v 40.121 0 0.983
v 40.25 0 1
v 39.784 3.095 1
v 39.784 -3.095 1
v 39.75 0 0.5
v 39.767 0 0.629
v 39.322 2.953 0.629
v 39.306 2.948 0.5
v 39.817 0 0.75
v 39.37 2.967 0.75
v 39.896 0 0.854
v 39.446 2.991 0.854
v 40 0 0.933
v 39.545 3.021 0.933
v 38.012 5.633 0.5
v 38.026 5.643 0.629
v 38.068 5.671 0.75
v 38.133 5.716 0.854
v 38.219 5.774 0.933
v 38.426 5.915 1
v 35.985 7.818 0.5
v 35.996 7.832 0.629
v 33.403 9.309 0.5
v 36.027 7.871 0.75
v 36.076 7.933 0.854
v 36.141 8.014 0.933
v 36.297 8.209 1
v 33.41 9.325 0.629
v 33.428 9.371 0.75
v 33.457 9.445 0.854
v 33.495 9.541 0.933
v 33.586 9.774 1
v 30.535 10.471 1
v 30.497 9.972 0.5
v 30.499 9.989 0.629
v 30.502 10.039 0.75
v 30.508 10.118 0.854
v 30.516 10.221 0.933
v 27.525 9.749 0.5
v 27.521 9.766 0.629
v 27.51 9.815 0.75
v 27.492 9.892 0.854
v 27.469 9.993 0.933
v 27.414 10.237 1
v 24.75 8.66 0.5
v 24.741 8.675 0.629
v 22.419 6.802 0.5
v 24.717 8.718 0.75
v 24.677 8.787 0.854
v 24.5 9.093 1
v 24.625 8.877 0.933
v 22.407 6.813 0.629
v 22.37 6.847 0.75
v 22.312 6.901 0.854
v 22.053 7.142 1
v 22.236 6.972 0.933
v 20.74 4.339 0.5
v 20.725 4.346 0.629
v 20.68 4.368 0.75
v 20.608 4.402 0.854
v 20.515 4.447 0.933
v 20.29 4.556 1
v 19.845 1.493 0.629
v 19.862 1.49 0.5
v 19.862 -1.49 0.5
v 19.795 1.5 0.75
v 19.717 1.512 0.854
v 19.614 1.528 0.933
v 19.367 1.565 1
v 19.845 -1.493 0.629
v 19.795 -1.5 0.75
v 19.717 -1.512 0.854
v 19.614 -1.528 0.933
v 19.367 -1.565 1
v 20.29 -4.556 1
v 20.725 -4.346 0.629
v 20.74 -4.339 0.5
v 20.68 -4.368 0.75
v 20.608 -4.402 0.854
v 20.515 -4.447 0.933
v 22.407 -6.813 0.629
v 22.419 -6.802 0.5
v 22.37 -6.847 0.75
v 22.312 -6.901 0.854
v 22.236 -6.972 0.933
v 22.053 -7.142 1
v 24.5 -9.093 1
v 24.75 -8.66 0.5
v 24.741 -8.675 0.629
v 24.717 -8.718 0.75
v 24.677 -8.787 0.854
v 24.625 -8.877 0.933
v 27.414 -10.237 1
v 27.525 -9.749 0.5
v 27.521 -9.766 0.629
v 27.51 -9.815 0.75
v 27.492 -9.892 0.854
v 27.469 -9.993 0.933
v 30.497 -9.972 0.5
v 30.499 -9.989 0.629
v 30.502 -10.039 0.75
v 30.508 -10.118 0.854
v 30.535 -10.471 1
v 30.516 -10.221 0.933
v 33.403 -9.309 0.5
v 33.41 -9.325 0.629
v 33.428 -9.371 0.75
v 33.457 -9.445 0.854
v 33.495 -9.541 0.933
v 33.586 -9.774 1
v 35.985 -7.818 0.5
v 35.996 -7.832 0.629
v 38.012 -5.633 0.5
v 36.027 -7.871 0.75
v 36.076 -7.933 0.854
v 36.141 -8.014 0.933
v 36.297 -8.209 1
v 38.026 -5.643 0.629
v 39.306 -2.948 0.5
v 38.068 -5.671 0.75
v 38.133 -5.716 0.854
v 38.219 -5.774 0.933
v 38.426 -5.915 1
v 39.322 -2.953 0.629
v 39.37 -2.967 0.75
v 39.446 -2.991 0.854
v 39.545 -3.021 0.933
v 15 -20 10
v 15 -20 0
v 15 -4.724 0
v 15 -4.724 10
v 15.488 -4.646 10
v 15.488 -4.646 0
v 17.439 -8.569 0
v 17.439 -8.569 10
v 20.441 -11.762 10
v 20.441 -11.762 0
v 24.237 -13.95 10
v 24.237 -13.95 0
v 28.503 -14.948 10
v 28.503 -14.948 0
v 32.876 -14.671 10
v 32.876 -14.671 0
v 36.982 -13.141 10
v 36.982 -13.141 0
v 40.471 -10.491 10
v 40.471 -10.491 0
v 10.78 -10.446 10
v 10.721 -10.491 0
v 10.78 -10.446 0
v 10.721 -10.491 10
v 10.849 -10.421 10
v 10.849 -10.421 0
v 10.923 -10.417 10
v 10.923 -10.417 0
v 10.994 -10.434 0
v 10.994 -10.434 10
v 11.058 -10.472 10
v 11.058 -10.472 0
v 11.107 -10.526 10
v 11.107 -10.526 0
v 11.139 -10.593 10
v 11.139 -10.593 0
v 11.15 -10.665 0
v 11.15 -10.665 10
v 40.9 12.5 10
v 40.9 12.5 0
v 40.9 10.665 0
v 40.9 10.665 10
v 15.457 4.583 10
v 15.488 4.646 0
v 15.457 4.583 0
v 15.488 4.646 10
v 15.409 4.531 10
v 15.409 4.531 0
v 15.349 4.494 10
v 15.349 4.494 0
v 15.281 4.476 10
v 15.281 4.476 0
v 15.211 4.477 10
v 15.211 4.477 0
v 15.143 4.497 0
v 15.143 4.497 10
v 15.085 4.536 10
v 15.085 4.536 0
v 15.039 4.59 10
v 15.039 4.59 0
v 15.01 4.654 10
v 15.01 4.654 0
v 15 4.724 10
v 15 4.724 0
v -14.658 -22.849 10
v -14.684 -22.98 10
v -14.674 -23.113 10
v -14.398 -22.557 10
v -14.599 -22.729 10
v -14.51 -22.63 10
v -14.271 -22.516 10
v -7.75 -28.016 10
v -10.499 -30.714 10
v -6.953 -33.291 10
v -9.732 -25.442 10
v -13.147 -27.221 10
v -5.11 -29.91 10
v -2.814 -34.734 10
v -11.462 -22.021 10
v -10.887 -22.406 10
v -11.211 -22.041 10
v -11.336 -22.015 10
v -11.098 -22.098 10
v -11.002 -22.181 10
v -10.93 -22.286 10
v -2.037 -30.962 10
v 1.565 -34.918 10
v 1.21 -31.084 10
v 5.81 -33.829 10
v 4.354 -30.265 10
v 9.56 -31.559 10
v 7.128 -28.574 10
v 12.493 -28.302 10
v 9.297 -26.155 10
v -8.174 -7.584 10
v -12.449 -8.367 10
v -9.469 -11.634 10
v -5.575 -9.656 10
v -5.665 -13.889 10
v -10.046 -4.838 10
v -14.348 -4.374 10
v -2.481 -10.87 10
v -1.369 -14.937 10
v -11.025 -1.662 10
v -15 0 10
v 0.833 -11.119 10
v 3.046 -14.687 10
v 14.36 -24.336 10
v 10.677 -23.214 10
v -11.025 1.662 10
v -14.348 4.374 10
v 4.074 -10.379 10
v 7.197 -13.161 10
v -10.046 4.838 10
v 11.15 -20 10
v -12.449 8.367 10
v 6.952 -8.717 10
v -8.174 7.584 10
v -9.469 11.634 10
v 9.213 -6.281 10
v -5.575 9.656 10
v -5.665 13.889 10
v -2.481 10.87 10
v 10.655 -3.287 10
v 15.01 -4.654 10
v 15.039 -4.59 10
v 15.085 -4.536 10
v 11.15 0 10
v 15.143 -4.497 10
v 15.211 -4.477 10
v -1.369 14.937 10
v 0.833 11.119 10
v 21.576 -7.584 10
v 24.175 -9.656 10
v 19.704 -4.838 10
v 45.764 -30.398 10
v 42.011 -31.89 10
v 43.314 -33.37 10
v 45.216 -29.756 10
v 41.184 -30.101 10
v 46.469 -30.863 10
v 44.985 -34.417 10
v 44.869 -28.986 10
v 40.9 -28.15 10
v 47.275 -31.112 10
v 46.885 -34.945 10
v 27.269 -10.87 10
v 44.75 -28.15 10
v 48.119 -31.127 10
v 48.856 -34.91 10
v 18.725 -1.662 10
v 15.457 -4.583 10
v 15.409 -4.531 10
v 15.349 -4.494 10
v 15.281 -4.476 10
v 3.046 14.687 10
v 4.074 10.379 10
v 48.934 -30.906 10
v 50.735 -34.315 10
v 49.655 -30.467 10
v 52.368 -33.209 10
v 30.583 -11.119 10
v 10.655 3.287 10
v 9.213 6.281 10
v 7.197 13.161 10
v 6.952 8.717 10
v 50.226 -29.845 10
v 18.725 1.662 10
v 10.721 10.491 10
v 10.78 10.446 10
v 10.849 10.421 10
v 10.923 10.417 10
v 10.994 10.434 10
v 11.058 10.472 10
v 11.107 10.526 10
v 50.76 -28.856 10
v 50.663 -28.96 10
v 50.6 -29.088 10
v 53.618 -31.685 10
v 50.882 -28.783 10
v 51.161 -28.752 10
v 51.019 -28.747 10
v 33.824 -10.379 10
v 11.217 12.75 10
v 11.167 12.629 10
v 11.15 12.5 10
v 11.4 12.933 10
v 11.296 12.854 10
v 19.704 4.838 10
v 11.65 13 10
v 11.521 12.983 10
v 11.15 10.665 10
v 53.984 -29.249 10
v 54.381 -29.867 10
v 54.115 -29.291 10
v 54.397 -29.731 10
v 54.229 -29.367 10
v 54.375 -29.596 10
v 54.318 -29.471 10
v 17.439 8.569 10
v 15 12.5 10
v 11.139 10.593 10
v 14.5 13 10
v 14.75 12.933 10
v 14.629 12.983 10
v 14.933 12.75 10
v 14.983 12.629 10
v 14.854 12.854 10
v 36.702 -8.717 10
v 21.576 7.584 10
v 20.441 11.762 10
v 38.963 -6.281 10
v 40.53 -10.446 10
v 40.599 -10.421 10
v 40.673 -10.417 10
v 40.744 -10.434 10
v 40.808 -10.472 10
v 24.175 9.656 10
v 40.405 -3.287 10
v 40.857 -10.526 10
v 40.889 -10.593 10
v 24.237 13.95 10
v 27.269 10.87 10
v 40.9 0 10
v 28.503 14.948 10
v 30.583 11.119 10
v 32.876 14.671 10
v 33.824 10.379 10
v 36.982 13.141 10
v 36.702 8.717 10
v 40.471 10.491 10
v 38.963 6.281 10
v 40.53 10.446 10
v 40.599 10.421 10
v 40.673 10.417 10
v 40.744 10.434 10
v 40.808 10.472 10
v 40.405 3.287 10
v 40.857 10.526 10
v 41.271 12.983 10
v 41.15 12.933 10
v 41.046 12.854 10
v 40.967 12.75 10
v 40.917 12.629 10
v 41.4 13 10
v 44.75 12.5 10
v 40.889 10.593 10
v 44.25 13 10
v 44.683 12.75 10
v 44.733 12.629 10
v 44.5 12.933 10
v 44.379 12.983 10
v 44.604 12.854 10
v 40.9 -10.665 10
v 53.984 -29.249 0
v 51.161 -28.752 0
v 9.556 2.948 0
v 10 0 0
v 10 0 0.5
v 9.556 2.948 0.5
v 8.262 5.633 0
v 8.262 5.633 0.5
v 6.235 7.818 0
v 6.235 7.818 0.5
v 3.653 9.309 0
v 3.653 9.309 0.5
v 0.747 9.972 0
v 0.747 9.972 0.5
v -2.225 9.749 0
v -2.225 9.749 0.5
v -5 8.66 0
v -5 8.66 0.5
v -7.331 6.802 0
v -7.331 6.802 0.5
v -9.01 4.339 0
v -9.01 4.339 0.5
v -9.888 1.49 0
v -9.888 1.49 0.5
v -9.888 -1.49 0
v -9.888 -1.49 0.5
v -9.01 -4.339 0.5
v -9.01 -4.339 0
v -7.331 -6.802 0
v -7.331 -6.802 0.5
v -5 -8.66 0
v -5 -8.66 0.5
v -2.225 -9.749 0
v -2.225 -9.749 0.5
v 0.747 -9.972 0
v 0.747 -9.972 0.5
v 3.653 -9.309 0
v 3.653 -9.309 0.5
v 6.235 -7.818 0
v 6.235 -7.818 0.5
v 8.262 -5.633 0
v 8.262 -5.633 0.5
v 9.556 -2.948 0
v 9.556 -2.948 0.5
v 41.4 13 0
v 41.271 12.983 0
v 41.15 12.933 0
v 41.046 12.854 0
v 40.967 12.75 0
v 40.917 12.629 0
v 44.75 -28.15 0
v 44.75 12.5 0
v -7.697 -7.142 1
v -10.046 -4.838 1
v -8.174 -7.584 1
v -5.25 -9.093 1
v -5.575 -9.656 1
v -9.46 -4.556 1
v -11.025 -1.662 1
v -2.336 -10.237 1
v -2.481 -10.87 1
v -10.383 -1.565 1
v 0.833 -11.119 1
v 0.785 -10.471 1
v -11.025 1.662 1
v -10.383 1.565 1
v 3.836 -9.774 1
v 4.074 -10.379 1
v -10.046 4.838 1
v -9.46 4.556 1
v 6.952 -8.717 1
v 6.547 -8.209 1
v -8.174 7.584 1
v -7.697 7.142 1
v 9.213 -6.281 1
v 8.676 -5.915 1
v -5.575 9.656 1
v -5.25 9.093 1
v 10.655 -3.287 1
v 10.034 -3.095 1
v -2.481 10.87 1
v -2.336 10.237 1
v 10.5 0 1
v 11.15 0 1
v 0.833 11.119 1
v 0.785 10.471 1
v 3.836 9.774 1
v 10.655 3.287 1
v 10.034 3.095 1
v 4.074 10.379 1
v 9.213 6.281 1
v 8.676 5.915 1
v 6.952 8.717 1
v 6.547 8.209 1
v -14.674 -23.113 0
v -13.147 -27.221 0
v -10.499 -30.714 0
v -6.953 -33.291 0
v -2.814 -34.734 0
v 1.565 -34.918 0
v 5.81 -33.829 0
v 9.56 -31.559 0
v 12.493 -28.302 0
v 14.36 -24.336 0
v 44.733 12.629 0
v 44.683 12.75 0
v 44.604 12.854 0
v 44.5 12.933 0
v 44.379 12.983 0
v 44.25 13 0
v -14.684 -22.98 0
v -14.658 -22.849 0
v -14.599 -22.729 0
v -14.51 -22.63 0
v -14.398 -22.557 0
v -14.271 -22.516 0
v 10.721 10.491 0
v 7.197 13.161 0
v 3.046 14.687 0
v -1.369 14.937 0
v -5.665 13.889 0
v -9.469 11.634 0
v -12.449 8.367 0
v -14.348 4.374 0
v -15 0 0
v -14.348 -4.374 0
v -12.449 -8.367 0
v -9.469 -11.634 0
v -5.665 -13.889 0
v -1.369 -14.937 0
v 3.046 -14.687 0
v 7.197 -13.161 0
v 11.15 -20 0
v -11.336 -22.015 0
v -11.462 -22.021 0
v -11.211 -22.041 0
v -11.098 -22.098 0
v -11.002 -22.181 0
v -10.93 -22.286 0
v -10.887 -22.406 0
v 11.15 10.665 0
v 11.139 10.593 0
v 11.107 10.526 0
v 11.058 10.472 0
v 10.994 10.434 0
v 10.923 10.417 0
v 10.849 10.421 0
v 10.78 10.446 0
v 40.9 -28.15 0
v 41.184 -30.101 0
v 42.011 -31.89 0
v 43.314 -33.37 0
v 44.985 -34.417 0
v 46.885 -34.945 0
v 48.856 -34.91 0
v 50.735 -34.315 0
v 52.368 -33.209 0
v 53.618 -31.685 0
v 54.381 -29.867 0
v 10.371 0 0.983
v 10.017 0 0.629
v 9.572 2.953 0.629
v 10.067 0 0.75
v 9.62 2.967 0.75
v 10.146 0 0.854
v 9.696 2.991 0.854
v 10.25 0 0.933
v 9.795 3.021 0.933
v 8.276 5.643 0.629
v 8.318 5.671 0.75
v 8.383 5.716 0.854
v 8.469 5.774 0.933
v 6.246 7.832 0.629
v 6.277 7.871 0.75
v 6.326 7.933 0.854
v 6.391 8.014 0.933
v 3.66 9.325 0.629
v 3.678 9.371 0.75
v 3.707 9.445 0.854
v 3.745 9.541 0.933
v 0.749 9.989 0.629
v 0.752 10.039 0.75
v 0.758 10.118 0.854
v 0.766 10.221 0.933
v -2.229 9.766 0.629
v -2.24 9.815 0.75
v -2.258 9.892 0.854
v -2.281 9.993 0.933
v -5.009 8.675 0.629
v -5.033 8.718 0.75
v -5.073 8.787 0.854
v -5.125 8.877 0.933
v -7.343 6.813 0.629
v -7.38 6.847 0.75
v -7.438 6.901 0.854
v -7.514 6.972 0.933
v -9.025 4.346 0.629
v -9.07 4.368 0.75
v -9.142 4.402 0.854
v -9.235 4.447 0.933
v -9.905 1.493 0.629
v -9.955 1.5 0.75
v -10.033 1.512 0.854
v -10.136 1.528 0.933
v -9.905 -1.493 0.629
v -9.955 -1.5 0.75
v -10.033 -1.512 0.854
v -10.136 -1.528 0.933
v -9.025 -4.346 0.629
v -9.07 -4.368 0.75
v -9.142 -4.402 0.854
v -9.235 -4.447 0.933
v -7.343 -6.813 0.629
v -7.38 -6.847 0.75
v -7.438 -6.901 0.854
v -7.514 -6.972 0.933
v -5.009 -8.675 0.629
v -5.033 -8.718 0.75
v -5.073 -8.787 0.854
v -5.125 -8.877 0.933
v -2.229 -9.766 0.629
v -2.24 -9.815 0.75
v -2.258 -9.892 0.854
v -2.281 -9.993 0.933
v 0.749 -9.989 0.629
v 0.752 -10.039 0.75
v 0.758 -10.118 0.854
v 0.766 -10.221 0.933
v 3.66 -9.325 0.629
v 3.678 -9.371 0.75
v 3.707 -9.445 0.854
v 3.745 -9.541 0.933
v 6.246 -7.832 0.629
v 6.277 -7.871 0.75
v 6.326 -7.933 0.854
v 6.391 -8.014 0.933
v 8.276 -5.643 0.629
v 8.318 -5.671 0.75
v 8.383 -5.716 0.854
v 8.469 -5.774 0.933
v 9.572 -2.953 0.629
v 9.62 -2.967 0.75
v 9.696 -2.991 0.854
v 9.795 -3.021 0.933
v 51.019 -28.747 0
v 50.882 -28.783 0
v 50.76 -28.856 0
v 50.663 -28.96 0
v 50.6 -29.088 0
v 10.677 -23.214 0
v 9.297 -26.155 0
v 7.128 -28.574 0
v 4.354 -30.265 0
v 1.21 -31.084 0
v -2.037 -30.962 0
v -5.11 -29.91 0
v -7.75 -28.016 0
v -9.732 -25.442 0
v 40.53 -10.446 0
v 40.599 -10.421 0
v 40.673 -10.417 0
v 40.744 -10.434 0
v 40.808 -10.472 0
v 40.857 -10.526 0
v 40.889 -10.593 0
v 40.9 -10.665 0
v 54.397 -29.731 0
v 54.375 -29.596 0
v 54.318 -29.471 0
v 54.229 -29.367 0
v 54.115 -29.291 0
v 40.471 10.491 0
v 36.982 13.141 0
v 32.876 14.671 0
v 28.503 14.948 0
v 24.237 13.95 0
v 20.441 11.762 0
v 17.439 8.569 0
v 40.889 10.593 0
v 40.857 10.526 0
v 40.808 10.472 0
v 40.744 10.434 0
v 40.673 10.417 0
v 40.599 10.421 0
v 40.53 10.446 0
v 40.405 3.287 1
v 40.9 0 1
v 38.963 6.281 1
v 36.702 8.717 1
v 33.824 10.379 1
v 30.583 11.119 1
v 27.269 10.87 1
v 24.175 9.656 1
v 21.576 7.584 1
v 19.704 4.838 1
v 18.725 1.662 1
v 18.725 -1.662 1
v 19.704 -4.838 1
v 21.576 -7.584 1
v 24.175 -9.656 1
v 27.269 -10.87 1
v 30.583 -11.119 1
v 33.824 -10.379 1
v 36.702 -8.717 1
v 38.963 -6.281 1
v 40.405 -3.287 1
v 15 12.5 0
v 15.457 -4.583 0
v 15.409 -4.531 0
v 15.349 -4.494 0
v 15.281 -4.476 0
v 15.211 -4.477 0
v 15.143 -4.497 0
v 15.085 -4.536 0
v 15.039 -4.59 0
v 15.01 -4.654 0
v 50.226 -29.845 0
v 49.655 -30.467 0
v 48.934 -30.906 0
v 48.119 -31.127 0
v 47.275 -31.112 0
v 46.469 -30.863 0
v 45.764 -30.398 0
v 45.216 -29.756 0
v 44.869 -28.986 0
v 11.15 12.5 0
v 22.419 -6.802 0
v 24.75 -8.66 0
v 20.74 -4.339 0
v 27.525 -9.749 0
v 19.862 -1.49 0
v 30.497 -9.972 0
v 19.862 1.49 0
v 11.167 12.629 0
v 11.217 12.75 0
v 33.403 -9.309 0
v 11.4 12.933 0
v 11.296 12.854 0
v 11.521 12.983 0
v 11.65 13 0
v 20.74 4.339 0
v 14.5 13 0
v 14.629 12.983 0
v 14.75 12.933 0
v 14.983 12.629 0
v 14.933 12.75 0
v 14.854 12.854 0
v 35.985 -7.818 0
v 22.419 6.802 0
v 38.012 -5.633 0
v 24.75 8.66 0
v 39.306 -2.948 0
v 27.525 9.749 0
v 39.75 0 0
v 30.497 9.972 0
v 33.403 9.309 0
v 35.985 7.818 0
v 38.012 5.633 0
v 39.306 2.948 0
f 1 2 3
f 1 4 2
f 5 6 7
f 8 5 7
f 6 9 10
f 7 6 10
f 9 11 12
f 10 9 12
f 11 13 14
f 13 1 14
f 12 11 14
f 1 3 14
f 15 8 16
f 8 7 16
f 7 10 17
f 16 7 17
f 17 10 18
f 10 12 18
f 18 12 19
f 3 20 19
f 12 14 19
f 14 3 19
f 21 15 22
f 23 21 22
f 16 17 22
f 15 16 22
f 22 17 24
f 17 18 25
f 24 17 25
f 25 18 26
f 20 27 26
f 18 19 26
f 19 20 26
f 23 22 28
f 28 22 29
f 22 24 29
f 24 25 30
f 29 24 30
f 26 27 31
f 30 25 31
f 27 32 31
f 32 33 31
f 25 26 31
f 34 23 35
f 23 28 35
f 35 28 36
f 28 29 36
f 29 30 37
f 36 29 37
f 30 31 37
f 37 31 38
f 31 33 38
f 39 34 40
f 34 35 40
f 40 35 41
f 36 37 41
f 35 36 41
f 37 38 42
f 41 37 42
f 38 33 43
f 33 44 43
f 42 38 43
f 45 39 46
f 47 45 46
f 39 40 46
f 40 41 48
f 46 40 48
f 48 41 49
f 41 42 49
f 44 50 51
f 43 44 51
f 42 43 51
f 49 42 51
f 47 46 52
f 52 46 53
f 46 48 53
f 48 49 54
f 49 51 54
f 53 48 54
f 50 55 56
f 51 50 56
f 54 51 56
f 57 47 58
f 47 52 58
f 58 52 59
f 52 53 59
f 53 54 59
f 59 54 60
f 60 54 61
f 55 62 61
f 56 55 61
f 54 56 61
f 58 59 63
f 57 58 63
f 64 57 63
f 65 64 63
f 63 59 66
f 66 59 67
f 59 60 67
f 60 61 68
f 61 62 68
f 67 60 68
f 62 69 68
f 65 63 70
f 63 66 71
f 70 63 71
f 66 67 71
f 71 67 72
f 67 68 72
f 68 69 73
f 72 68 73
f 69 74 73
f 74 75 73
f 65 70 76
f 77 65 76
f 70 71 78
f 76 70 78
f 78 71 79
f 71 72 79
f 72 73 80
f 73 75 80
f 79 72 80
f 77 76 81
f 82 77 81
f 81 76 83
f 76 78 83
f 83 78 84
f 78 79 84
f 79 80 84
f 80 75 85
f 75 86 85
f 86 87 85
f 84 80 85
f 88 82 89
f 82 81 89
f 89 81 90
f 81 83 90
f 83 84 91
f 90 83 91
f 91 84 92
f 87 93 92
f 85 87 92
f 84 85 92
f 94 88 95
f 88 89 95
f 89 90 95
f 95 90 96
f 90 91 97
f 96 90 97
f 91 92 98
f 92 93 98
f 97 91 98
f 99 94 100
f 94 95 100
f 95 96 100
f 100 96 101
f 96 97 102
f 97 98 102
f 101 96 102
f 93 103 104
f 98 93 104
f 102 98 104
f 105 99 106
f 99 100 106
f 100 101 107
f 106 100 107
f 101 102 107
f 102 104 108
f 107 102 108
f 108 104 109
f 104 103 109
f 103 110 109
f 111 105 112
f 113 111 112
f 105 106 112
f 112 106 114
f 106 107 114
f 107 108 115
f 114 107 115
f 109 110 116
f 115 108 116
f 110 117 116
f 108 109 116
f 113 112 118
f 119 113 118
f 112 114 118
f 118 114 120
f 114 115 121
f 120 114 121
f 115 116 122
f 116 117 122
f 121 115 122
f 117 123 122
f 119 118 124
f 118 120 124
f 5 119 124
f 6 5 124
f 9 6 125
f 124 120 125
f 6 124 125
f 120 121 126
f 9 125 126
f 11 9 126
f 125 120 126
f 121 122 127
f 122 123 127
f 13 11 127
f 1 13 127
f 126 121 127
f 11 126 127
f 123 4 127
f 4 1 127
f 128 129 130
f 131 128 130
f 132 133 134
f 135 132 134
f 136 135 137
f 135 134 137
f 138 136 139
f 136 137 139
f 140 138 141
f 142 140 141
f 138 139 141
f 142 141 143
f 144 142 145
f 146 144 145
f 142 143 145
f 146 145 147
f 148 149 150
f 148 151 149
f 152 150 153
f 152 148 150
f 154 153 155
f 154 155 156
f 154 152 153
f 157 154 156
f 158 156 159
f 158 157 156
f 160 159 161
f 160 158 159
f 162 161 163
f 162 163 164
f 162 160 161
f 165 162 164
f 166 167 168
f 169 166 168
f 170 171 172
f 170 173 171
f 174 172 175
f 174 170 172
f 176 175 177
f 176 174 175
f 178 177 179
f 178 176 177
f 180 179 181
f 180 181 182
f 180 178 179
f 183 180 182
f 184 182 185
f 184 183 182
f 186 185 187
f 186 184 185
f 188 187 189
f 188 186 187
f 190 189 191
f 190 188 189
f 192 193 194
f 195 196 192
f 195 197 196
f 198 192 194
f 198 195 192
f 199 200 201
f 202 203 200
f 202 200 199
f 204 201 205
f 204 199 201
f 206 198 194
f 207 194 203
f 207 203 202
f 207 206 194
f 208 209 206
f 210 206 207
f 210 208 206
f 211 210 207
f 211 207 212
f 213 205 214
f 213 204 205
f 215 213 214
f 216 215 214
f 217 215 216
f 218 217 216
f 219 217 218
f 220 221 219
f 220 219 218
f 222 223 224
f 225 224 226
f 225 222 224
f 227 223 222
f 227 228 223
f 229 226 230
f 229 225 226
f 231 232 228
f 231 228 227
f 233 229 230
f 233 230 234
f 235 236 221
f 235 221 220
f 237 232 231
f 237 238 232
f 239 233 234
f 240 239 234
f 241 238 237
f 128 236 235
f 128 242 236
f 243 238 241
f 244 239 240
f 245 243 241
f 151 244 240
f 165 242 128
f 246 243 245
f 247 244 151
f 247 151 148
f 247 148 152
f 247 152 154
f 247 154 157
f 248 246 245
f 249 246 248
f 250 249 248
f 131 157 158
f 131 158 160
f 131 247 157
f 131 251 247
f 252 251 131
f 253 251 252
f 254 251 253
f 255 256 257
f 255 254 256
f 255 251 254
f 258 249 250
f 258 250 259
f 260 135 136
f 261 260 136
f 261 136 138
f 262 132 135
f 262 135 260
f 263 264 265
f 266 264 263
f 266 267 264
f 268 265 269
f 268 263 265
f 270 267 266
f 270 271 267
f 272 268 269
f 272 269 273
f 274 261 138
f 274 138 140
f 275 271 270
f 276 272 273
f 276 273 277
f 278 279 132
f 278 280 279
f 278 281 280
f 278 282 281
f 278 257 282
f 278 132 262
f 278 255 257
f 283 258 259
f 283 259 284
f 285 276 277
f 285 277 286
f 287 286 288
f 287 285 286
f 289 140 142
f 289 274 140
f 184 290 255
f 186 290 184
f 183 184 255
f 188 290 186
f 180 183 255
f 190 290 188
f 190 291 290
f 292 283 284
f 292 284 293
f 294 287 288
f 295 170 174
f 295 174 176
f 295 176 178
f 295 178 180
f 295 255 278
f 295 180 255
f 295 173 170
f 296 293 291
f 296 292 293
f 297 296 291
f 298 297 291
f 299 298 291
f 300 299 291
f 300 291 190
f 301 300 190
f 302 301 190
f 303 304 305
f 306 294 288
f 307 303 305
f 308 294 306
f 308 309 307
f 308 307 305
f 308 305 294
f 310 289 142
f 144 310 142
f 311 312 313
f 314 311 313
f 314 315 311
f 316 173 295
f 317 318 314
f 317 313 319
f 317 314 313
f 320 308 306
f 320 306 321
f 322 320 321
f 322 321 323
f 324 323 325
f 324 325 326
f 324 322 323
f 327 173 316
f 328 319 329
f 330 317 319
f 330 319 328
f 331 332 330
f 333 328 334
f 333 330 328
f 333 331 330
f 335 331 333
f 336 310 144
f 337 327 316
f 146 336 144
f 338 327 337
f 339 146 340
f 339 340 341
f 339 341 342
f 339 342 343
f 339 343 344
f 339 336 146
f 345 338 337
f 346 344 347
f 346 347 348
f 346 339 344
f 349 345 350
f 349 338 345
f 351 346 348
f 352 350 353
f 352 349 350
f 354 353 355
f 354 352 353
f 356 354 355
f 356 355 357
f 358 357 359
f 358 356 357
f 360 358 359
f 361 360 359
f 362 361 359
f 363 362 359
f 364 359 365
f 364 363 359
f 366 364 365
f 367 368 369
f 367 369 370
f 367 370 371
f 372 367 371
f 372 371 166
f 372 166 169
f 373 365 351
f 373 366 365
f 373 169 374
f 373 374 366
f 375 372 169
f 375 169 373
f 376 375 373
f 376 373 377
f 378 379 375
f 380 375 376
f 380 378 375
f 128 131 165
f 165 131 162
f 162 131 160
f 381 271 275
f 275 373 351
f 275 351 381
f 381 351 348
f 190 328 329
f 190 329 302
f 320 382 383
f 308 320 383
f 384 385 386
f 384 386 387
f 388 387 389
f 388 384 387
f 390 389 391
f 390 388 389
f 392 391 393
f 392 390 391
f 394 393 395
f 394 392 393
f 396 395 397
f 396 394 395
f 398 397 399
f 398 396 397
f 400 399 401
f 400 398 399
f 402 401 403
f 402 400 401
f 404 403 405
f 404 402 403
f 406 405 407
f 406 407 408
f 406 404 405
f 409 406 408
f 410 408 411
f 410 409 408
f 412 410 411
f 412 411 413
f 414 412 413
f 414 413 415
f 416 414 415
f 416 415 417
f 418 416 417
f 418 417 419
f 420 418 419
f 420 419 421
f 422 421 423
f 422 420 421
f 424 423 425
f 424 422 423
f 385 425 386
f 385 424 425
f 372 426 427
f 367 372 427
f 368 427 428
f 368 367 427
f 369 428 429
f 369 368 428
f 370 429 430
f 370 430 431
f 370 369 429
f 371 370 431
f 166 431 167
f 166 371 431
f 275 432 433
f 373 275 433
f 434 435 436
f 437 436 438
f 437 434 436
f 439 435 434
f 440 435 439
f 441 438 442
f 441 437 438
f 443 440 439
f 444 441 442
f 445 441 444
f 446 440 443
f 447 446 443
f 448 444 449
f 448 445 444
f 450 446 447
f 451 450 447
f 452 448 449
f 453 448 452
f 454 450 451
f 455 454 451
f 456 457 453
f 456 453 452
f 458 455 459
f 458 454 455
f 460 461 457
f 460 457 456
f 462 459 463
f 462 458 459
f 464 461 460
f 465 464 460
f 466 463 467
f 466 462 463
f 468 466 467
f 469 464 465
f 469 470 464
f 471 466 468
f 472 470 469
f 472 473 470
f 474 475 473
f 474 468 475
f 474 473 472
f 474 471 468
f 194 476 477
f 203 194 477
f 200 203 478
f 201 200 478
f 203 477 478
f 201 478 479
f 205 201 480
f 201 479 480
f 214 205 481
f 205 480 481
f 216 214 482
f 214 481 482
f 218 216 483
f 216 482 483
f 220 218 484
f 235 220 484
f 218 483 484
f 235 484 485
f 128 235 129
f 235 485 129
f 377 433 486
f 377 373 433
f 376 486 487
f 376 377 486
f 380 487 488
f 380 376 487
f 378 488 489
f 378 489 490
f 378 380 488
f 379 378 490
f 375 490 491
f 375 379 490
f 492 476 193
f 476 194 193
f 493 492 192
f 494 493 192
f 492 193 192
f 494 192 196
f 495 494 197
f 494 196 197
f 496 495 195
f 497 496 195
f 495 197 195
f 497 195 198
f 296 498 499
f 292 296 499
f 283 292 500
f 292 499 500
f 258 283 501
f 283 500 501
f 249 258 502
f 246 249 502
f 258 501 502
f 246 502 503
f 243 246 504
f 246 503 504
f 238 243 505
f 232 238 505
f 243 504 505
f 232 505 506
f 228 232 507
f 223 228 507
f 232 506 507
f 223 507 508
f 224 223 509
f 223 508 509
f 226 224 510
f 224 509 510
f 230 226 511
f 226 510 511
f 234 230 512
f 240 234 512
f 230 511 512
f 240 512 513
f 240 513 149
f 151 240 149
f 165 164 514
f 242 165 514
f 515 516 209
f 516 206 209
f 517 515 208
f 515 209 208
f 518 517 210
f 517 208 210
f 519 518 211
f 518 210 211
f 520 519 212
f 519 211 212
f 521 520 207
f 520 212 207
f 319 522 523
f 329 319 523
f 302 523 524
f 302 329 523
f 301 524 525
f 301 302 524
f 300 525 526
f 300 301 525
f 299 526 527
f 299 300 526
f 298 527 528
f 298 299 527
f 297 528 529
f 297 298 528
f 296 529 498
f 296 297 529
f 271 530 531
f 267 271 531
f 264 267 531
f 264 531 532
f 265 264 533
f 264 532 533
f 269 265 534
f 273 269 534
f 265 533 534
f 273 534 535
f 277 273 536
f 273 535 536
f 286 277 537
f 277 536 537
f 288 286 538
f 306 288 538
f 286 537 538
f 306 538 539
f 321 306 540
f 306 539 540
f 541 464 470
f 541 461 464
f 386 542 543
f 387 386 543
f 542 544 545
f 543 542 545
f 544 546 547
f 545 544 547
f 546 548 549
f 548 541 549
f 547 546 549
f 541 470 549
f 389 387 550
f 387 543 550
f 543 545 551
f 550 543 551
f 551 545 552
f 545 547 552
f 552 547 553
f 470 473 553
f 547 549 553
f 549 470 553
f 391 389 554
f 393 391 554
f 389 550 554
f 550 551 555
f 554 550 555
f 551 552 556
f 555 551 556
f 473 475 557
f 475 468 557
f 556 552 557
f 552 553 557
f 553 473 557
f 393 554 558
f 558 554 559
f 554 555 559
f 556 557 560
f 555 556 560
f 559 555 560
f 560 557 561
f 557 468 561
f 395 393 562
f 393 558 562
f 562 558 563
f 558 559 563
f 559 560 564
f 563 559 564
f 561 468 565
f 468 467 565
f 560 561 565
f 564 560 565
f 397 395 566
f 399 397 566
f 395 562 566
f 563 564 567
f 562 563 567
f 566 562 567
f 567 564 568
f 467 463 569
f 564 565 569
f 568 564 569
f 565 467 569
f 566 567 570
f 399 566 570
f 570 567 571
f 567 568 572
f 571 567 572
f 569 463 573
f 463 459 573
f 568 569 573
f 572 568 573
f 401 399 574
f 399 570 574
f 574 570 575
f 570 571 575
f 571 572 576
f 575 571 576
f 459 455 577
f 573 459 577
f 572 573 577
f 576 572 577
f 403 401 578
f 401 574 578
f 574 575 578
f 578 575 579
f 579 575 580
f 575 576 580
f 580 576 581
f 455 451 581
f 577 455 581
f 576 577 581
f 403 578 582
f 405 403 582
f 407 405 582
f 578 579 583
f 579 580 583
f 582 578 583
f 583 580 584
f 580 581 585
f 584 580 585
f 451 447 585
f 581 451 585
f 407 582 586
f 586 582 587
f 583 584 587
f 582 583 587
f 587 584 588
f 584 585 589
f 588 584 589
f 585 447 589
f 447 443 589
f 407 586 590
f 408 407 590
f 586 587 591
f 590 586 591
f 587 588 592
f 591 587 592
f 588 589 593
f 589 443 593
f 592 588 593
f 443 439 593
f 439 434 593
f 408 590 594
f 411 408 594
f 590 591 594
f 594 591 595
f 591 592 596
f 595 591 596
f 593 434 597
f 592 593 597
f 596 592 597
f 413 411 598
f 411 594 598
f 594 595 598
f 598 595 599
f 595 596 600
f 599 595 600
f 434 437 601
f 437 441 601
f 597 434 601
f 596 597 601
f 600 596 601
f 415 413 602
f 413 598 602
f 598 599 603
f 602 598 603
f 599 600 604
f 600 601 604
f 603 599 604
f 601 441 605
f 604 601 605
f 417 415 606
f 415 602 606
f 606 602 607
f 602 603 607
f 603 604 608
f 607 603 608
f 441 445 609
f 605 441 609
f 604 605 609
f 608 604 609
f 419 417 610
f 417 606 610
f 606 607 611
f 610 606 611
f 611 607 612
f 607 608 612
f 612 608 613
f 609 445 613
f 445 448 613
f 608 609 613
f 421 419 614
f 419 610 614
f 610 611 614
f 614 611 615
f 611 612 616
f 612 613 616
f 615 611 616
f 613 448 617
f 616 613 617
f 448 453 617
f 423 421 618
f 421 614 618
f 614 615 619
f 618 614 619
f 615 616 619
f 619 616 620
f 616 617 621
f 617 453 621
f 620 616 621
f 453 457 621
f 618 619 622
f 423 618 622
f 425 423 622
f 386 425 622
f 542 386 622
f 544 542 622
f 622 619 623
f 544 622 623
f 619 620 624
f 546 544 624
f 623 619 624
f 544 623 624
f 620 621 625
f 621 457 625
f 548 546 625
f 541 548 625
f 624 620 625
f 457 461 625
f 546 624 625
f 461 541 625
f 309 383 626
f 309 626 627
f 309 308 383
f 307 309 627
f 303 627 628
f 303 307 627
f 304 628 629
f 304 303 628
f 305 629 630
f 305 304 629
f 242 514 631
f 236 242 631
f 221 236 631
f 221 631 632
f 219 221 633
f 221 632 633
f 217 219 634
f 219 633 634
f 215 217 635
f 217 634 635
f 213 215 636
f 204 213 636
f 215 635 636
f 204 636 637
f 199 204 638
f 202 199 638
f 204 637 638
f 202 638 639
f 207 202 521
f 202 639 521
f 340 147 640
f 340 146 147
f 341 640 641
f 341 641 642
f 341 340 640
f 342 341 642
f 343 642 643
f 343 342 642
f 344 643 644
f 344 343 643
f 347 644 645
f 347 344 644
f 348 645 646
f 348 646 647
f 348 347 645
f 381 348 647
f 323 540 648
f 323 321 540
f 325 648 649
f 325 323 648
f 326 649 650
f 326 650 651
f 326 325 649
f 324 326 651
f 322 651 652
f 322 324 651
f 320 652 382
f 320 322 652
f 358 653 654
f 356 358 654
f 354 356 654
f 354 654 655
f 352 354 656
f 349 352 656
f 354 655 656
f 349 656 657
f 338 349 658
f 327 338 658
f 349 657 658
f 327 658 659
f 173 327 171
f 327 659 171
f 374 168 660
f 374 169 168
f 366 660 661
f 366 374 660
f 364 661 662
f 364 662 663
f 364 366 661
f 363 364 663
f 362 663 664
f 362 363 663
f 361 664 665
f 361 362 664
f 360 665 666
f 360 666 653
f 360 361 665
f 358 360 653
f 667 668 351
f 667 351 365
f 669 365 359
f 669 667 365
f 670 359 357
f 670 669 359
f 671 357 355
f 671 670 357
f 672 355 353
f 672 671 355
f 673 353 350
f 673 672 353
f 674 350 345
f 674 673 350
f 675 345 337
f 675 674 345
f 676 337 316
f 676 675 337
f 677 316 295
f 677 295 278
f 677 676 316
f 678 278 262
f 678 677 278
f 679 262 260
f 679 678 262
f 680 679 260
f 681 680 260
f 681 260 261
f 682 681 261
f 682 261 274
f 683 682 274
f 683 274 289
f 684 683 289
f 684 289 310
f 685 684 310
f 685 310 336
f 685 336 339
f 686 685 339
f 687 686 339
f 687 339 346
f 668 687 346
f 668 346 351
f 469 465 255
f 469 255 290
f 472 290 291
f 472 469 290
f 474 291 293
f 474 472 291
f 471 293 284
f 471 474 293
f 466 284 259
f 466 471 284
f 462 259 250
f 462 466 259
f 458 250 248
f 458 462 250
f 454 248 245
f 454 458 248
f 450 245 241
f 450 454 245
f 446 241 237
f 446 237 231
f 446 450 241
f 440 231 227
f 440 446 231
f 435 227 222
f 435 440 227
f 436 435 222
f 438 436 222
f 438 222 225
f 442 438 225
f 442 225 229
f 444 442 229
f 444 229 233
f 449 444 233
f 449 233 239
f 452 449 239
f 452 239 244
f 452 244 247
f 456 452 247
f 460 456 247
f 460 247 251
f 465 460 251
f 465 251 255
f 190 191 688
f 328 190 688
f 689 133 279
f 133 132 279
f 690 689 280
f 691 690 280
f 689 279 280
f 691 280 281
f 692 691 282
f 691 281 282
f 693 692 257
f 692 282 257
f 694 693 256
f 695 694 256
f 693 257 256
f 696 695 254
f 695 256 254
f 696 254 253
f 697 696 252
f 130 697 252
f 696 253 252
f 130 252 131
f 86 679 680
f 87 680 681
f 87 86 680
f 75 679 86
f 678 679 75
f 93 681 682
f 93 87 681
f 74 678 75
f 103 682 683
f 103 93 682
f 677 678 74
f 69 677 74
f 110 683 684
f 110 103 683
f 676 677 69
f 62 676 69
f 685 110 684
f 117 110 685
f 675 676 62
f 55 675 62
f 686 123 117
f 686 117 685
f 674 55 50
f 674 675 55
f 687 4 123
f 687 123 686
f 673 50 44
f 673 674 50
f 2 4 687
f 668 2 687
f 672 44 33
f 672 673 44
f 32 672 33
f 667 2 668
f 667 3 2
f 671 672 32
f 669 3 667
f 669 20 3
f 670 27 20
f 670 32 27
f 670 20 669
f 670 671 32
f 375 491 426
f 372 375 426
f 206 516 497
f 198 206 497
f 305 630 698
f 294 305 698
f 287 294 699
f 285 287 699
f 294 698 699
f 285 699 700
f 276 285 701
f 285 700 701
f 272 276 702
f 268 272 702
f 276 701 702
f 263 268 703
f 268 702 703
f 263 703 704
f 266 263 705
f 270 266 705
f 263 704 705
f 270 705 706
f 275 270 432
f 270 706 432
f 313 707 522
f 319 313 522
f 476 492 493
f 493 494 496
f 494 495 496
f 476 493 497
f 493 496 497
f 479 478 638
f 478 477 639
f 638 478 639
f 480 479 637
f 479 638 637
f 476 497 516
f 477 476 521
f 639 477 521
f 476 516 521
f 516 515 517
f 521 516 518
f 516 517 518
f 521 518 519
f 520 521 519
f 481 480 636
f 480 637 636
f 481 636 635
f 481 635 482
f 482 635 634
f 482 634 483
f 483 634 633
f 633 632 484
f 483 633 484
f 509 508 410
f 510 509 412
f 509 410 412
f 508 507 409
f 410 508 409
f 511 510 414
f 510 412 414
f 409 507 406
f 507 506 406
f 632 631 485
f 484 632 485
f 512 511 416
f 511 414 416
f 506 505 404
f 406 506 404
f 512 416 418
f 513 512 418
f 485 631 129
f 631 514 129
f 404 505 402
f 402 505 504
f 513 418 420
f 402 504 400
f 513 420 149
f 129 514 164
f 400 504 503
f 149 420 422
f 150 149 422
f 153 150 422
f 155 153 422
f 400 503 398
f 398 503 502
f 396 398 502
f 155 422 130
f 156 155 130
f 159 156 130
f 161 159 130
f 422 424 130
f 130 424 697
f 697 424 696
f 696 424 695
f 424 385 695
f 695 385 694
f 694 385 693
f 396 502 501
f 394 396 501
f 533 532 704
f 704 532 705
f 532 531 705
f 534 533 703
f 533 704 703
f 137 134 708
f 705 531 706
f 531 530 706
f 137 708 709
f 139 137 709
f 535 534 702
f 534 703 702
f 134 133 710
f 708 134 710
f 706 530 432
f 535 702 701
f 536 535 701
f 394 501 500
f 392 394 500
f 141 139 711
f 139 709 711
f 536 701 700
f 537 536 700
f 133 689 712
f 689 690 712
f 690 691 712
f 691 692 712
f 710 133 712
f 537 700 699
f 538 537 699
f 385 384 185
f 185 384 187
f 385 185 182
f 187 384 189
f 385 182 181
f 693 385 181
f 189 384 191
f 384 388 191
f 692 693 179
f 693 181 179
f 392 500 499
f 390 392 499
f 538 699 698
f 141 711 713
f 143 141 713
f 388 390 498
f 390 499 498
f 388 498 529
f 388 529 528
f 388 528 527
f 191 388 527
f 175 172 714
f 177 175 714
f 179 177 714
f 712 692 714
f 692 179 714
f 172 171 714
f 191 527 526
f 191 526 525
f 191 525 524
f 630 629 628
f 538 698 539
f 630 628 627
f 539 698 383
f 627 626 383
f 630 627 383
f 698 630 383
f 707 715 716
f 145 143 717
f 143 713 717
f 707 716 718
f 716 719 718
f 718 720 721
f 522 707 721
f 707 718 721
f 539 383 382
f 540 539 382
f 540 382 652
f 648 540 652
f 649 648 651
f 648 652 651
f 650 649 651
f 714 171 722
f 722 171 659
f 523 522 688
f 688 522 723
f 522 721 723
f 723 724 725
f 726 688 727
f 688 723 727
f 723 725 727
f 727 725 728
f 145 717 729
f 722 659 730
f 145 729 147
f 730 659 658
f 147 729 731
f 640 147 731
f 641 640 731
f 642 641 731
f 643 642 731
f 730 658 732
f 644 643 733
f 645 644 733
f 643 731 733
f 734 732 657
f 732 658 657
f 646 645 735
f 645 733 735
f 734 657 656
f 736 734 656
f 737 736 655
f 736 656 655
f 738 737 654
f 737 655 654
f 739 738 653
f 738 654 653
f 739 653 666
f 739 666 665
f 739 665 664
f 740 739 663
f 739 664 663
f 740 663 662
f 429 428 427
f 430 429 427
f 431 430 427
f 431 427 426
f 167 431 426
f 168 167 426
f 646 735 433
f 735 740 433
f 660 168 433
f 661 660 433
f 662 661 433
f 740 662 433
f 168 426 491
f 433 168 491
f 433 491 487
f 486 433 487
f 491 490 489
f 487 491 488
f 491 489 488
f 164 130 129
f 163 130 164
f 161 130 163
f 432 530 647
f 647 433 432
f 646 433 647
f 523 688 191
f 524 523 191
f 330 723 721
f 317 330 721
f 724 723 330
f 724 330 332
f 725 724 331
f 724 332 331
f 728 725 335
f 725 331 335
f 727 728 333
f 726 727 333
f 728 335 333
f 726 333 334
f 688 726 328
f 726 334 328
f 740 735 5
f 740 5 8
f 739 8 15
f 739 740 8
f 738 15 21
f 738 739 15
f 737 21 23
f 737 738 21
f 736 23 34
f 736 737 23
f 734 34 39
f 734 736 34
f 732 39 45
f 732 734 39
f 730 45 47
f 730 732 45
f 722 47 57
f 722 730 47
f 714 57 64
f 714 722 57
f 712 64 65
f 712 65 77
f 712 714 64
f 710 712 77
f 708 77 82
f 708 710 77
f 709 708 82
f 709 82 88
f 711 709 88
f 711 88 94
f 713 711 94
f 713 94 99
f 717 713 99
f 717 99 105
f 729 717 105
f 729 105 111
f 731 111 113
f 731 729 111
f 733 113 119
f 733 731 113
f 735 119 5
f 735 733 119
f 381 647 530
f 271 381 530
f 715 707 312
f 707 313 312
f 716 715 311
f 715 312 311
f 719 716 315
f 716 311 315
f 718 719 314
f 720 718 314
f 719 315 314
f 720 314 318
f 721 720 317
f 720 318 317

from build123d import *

# Parameters (mm, degrees)
F0_R     = 11.15
F1_DEPTH = 10
F2_R     = 11.5
F2_R_2   = 10
F3_DEPTH = 1
F4_R     = 0.5
F5_R     = 0.25
F6_R     = 0.5


with BuildPart() as f1:
    # F0 (on Top) → F1 (new body)
    with BuildSketch(Plane.XY):
        with BuildLine():
            ThreePointArc((14.875, 1.9324531042), (13.6283962301, 6.2663239778), (11.15, 10.0338178178))
            ThreePointArc((11.15, 10.0338178178), (-15, 0), (11.15, -10.0338178178))
            Line((11.15, -10.0338178178), (11.15, -20))
            ThreePointArc((11.15, -20), (0.9717865316, -31.1075708837), (-10.9806064461, -21.936177181))
            Line((-10.9806064461, -21.936177181), (-14.7721162952, -22.604722665))
            ThreePointArc((-14.7721162952, -22.604722665), (1.3073361412, -34.9429204714), (15, -20))
            Line((15, -20), (15, -2.7271780287))
            ThreePointArc((15, -2.7271780287), (14.7553944092, -0.4022476555), (14.875, 1.9324531042))
        make_face()
        Circle(F0_R, mode=Mode.SUBTRACT)
        with BuildLine():
            ThreePointArc((15, 2.7271780287), (14.9321711045, 2.3306537331), (14.875, 1.9324531042))
            ThreePointArc((14.875, 1.9324531042), (14.9687173799, 0.9682458366), (15, 0))
            Line((15, 0), (15, 2.7271780287))
        make_face()
        with BuildLine():
            Line((11.15, 13), (11.15, 10.0338178178))
            ThreePointArc((11.15, 10.0338178178), (13.6283962301, 6.2663239778), (14.875, 1.9324531042))
            ThreePointArc((14.875, 1.9324531042), (14.9321711045, 2.3306537331), (15, 2.7271780287))
            Line((15, 2.7271780287), (15, 13))
            Line((15, 13), (11.15, 13))
        make_face()
        with BuildLine():
            Line((15, 2.7271780287), (15, 0))
            Line((15, 0), (15, -2.7271780287))
            ThreePointArc((15, -2.7271780287), (25.6773170696, -14.4365249887), (40.9, -10.0338178178))
            Line((40.9, -10.0338178178), (40.9, 0))
            Line((40.9, 0), (40.9, 10.0338178178))
            ThreePointArc((40.9, 10.0338178178), (25.6773170696, 14.4365249887), (15, 2.7271780287))
        make_face()
        with Locations((29.75, 0)):
            Circle(F0_R, mode=Mode.SUBTRACT)
        with BuildLine():
            ThreePointArc((15, 0), (14.9687173799, 0.9682458366), (14.875, 1.9324531042))
            ThreePointArc((14.875, 1.9324531042), (14.7553944092, -0.4022476555), (15, -2.7271780287))
            Line((15, -2.7271780287), (15, 0))
        make_face()
        with BuildLine():
            ThreePointArc((44.75, 0), (43.7544635742, 5.3735463151), (40.9, 10.0338178178))
            Line((40.9, 10.0338178178), (40.9, 0))
            Line((40.9, 0), (40.9, -10.0338178178))
            ThreePointArc((40.9, -10.0338178178), (43.7544635742, -5.3735463151), (44.75, 0))
        make_face()
        with BuildLine():
            Line((40.9, 13), (40.9, 10.0338178178))
            ThreePointArc((40.9, 10.0338178178), (43.7544635742, 5.3735463151), (44.75, 0))
            Line((44.75, 0), (44.75, 13))
            Line((44.75, 13), (40.9, 13))
        make_face()
        with BuildLine():
            ThreePointArc((44.75, 0), (43.7544635742, -5.3735463151), (40.9, -10.0338178178))
            Line((40.9, -10.0338178178), (40.9, -28.15))
            Line((40.9, -28.15), (44.75, -28.15))
            Line((44.75, -28.15), (44.75, 0))
        make_face()
        with BuildLine():
            Line((44.75, -28.15), (40.9, -28.15))
            ThreePointArc((40.9, -28.15), (47.1529831622, -34.9739336819), (54.4959331081, -29.339490017))
            Line((54.4959331081, -29.339490017), (50.704423259, -28.670944533))
            ThreePointArc((50.704423259, -28.670944533), (47.4885327718, -31.1385840943), (44.75, -28.15))
        make_face()
    extrude(amount=F1_DEPTH)

    # F2 (on Top) → F3 (join)
    with BuildSketch(Plane.XY):
        Circle(F2_R)
        Circle(F2_R_2, mode=Mode.SUBTRACT)
        with Locations((29.75, 0)):
            Circle(F2_R)
        with Locations((29.75, 0)):
            Circle(F2_R_2, mode=Mode.SUBTRACT)
    extrude(amount=F3_DEPTH)

    # F4
    f4_edges = [f1.edges().sort_by_distance(p)[0] for p in [
        (-10, 0, 1),
        (19.75, 0, 1),
    ]]
    fillet(f4_edges, radius=F4_R)

    # F5
    f5_edges = [f1.edges().sort_by_distance(p)[0] for p in [
        (15, -2.727178, 5),
        (15, 2.727178, 5),
        (11.15, 10.033818, 5),
        (40.9, 10.033818, 5),
        (11.15, -10.033818, 5),
        (40.9, -10.033818, 5),
    ]]
    fillet(f5_edges, radius=F5_R)

    # F6
    f6_edges = [f1.edges().sort_by_distance(p)[0] for p in [
        (-10.980606, -21.936177, 5),
        (-14.772116, -22.604723, 5),
        (11.15, 13, 5),
        (15, 13, 5),
        (40.9, 13, 5),
        (44.75, 13, 5),
        (54.495933, -29.33949, 5),
        (50.704423, -28.670945, 5),
    ]]
    fillet(f6_edges, radius=F6_R)


solid = f1.part
